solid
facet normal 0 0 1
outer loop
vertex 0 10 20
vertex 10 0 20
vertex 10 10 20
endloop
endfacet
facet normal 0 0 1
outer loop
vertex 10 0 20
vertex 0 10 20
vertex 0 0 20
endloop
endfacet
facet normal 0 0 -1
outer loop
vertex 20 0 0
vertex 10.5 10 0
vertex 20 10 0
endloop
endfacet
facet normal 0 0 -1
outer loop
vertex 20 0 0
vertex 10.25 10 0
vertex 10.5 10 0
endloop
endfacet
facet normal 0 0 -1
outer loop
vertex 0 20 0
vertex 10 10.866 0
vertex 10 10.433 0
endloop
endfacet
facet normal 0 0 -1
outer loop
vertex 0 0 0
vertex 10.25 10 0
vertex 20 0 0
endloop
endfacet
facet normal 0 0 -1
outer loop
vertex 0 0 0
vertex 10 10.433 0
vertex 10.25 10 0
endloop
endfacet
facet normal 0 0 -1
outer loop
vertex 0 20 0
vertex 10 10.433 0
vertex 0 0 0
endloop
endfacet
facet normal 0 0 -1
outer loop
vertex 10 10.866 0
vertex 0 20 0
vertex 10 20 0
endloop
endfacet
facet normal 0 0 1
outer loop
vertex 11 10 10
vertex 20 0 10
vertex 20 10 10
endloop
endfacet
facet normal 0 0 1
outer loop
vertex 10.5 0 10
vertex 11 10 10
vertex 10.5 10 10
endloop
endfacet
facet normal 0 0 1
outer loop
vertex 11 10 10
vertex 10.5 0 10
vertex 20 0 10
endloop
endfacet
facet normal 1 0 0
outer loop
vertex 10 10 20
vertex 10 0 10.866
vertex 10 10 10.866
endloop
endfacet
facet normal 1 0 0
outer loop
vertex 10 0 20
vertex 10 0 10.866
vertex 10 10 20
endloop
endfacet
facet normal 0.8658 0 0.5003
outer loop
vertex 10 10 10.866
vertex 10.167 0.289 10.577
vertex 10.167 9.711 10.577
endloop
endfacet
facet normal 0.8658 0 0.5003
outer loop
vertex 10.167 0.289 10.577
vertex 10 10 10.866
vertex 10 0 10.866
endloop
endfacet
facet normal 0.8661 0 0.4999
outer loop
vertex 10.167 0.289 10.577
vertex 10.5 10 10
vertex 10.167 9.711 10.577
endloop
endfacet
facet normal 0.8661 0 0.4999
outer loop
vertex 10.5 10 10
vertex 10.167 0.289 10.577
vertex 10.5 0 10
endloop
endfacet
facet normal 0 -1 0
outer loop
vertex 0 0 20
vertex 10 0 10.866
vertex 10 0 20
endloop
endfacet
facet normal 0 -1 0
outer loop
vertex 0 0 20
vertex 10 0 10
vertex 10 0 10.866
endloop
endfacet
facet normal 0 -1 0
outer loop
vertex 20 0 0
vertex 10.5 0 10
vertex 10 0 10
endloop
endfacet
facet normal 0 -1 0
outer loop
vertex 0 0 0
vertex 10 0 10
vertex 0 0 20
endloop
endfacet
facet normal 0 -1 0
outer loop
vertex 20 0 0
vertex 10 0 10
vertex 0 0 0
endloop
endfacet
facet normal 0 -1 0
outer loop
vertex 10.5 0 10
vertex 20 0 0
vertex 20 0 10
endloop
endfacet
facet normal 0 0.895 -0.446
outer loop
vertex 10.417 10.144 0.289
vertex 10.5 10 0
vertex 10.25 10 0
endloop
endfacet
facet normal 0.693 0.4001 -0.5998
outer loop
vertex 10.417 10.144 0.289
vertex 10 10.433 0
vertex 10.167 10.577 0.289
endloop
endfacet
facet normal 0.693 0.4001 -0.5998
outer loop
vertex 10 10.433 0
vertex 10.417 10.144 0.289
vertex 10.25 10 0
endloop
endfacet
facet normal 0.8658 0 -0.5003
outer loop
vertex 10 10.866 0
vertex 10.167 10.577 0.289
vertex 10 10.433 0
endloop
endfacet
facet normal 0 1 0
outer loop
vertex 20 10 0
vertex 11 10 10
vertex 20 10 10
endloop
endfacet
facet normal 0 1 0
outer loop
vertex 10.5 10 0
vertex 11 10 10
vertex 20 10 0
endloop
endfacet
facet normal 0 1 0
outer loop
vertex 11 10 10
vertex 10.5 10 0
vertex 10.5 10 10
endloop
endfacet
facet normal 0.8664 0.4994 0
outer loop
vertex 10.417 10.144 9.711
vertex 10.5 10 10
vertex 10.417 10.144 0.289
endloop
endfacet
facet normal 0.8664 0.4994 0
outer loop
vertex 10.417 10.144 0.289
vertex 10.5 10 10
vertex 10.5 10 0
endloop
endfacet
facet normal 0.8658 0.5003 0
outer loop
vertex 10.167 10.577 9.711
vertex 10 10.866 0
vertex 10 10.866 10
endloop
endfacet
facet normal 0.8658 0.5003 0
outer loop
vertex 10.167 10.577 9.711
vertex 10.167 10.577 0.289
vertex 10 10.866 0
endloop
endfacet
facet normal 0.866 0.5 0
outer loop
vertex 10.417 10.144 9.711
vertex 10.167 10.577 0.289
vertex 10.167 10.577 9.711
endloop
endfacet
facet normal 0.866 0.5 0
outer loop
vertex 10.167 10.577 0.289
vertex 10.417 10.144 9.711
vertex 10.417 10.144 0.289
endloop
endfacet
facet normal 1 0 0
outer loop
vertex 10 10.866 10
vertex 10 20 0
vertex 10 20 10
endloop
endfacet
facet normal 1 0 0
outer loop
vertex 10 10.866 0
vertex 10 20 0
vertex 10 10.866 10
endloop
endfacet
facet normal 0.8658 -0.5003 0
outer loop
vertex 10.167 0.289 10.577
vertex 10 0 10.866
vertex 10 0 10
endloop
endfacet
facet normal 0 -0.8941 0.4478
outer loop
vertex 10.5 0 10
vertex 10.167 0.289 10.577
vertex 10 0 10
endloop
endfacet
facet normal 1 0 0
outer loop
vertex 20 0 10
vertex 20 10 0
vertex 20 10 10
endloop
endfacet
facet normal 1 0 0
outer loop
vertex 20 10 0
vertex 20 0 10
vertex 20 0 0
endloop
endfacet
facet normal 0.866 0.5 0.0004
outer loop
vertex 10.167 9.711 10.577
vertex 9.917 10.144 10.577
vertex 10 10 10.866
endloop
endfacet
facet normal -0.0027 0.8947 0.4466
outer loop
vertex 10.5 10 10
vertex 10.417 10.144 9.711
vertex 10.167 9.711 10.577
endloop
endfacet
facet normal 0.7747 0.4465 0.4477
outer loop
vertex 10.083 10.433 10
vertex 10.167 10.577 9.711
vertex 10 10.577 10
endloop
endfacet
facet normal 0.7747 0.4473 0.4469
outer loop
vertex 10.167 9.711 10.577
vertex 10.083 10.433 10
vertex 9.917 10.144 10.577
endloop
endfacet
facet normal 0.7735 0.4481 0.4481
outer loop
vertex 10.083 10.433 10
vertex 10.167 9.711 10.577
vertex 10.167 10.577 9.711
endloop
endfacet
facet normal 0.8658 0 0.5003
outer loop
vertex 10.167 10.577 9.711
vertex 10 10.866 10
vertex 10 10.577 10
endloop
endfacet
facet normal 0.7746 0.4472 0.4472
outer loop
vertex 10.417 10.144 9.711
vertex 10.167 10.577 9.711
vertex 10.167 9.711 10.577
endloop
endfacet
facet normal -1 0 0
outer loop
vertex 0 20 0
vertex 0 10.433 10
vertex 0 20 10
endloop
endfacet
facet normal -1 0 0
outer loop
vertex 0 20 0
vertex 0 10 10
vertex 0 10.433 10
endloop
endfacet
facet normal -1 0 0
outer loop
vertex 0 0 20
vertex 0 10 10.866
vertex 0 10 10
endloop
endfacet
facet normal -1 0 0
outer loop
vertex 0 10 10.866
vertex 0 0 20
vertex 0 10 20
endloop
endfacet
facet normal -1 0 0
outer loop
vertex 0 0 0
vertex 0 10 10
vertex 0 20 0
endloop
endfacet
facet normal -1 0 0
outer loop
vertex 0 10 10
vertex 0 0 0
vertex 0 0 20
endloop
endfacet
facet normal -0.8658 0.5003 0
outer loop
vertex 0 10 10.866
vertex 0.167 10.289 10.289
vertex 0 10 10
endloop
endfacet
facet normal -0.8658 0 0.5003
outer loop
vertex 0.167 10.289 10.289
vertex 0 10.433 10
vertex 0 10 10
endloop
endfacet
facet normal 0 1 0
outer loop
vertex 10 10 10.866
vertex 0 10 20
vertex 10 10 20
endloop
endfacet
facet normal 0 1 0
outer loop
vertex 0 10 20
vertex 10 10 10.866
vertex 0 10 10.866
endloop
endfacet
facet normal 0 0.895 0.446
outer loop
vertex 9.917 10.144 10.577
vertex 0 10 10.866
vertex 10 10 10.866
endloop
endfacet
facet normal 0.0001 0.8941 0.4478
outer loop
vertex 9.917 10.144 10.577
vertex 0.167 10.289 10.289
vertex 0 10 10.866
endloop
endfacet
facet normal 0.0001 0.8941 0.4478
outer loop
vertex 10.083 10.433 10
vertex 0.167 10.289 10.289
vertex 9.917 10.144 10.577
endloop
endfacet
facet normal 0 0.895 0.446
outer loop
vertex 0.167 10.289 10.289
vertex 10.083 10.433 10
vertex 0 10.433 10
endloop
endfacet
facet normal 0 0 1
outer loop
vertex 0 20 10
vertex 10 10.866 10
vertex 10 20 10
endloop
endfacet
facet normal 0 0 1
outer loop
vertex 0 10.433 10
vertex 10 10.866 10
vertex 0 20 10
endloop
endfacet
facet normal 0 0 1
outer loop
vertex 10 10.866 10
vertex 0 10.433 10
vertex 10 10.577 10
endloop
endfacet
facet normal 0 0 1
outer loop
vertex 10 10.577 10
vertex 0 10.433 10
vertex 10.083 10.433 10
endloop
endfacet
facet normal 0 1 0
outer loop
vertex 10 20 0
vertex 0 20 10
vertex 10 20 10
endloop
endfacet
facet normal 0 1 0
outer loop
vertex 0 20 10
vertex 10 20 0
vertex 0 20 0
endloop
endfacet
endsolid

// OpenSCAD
// by: Scorch
// http://www.scorchworks.com/Blog/openscad-modules-for-automatic-fillets-and-radii/
// www.scorchworks.com
// 12/29/2015

// PARAMETERS

sample_R    = 1;      // Radius of the fillet/round to be added

sample_OB   = 1000;   // Outer boundary (should be larger than model outer boundary)

sample_axis = "xyz";  // ["xyz":"xyz",x:x,y:y,z:z]
                      // axes to round choose one (x,y,z, or xyz)

sample_fn   = 6;      // number of facets on radius (per 360 degrees)

MAKE_EXAMPLE = 1;    // [0:Generate sample base part,1: Add fillets to base part,2: Add rounds to base part,3: Add fillets and rounds to base part,4: Add local fillets to base part,5: Add local rounds to base part,6: Add local fillets and local rounds to base part, 7: Show transparent local area selection box on base part]

//-1: Do not make example part
// 0: Generate sample base part
// 1: Add fillets to base part 
// 2: Add rounds to base part 
// 3: Add fillets and rounds to base part 
// 4: Add local fillets to base part 
// 5: Add local rounds to base part 
// 6: Add local fillets and local rounds to base part 
// 7: Show transparent local area selection box on base part 
//

//////////////////////////////////////////////////////////////////////////
//////////////////////////////////////////////////////////////////////////

// The add_fillets module will either auto fillet the whole model or
// a section of the model depending on if ther are one or two children.
// 1 child:       Fillet the whole model
// Two children:  Fillet the first child in the area that is
//                 intersected by the second child 
module add_fillets(R=1,OB=1000,axis="xyz",fn=10)
{
    fn_even = ceil(fn/2)*2;
    if ($children==1)
    {
        minkowski_fillets(R=R,OB=OB,axis=axis,fn=fn_even)
        {
            children(0);
        }
    }
    if ($children==2)
    {
        union()
        {
            minkowski_fillets(R=R,OB=OB,axis=axis,fn=fn_even)
            {
                intersection()
                {
                    children(0);
                    children(1);
                }
            }
            difference()
            {
                children(0);
                children(1);
            }
        }
    }
}


// The add_rounds module will either auto round the whole model or
// a section of the model depending on if ther are one or two children.
// 1 child:       Round the whole model
// Two children:  Round the first child in the area that is
//                  intersected by the second child 
module add_rounds(R=1,OB=1000,axis="xyz",fn=10)
{
    fn_even = ceil(fn/2)*2;
    if ($children==1)
    {
        minkowski_rounds(R=R,OB=OB,axis=axis,fn=fn_even)
        {
            children(0);
        }
    }
    if ($children==2)
    {
        union()
        {
            minkowski_rounds(R=R,OB=OB,axis=axis,fn=fn_even)
            {
                intersection()
                {
                    children(0);
                    minkowski()
                    {
                        children(1);
                        if (axis=="x")   rotate([0 ,90,0]) cylinder(r=R,$fn=fn_even,center=true);
                        if (axis=="y")   rotate([90,0 ,0]) cylinder(r=R,$fn=fn_even,center=true);
                        if (axis=="z")   rotate([0 ,0 ,0]) cylinder(r=R,$fn=fn_even,center=true);
                        if (axis=="xyz") sphere(r=R,$fn=fn_even);
                    }
                }
            }
            difference()
            {
                children(0);
                children(1);
            }
        }
    }
}




module minkowski_fillets(R=1,OB=1000,axis="xyz",fn=10)
{
    OBplus=OB+4*R;
    fn_even = ceil(fn/2)*2;
    echo(fn_even);
    difference()
    {
        cube([OB,OB,OB],center=true);
        minkowski()
        {   
            difference()
            {
                cube([OBplus,OBplus,OBplus],center=true);
                minkowski()
                {
                    children(0);
                    if (axis=="x")   rotate([0 ,90,0]) cylinder(r=R,$fn=fn_even,center=true);
                    if (axis=="y")   rotate([90,0 ,0]) cylinder(r=R,$fn=fn_even,center=true);
                    if (axis=="z")   rotate([0 ,0 ,0]) cylinder(r=R,$fn=fn_even,center=true);
                    if (axis=="xyz") sphere(r=R,$fn=fn);
                }
            }
            if (axis=="x")   rotate([0 ,90,0]) cylinder(r=R,$fn=fn_even,center=true);
            if (axis=="y")   rotate([90,0 ,0]) cylinder(r=R,$fn=fn_even,center=true);
            if (axis=="z")   rotate([0 ,0 ,0]) cylinder(r=R,$fn=fn_even,center=true);
            if (axis=="xyz") sphere(r=R,$fn=fn_even);
        }
    }
}


module minkowski_rounds(R=1,OB=1000,axis="xyz",fn=10)
{
    OBplus=OB+4*R;
    fn_even = ceil(fn/2)*2;
    minkowski()
    {  
        difference()
        {
            cube([OB,OB,OB],center=true);
            minkowski()
            {
                difference()
                {
                    cube([OBplus,OBplus,OBplus],center=true);
                    children(0);
                }
                if (axis=="x")   rotate([0 ,90,0]) cylinder(r=R,$fn=fn_even,center=true);
                if (axis=="y")   rotate([90,0 ,0]) cylinder(r=R,$fn=fn_even,center=true);
                if (axis=="z")   rotate([0 ,0 ,0]) cylinder(r=R,$fn=fn_even,center=true);
                if (axis=="xyz") sphere(r=R,$fn=fn_even);
            }
        }
        if (axis=="x")   rotate([0 ,90,0]) cylinder(r=R,$fn=fn,center=true);
        if (axis=="y")   rotate([90,0 ,0]) cylinder(r=R,$fn=fn,center=true);
        if (axis=="z")   rotate([0 ,0 ,0]) cylinder(r=R,$fn=fn,center=true);
        if (axis=="xyz") sphere(r=R,$fn=fn_even);      
    }
}

//////////////////////////////////////////////////////////
//The remainder of this file contains the Sample models //
//////////////////////////////////////////////////////////
// ------------------------------   
// Base sample object
// ------------------------------
if (MAKE_EXAMPLE==0)
    fillets_and_rounds_sample_object();

// ------------------------------   
// Sample add fillets
// ------------------------------
if (MAKE_EXAMPLE==1)
    render()
        add_fillets(R=sample_R,OB=sample_OB,axis=sample_axis,fn=sample_fn)
            fillets_and_rounds_sample_object();

// ------------------------------   
// Sample add rounds
// ------------------------------
if (MAKE_EXAMPLE==2)
    render()
        add_rounds(R=sample_R,OB=sample_OB,axis=sample_axis,fn=sample_fn)
            fillets_and_rounds_sample_object();
   
// ------------------------------   
// Sample add rounds and fillets
// ------------------------------
if (MAKE_EXAMPLE==3)
{
    render()
        add_fillets(R=sample_R,OB=sample_OB,axis=sample_axis,fn=sample_fn)
            add_rounds(R=sample_R,OB=sample_OB,axis=sample_axis,fn=sample_fn)
                fillets_and_rounds_sample_object();
}       

// ------------------------------   
// Sample add local fillets
// ------------------------------
if (MAKE_EXAMPLE==4)
{
    render()
        add_fillets(R=sample_R,OB=sample_OB,axis=sample_axis,fn=sample_fn)
        {
            fillets_and_rounds_sample_object();
            translate([10,10,0])cube([10,10,50],center=true);
        }
}

// ------------------------------   
// Sample add local rounds
// ------------------------------
if (MAKE_EXAMPLE==5)
{
    render()
        add_rounds(R=sample_R,OB=sample_OB,axis=sample_axis,fn=sample_fn)
        {
            fillets_and_rounds_sample_object();
            translate([10,10,0])cube([10,10,50],center=true);
        }
}

// ------------------------------   
// Sample add rounds and fillets
// ------------------------------
if (MAKE_EXAMPLE==6)
{
    render()
        add_fillets(R=sample_R,OB=sample_OB,axis=sample_axis,fn=sample_fn)
        {
            add_rounds(R=sample_R,OB=sample_OB,axis=sample_axis,fn=sample_fn)
            {
                fillets_and_rounds_sample_object();
                translate([10,10,0])cube([10,10,50],center=true);
            }
            translate([10,10,0])cube([10,10,50],center=true);
        }
}


// ------------------------------   
// Sample Show Intersecting Box
// ------------------------------
if (MAKE_EXAMPLE==7)
{
    fillets_and_rounds_sample_object();
    %translate([10,10,0])cube([10,10,50],center=true);

}

// -------------------
// Sample Object module
// -------------------
module fillets_and_rounds_sample_object()
{
    cube([10,20,10]);
    cube([20,10,10]);
    cube([10,10,20]);
}

// END
